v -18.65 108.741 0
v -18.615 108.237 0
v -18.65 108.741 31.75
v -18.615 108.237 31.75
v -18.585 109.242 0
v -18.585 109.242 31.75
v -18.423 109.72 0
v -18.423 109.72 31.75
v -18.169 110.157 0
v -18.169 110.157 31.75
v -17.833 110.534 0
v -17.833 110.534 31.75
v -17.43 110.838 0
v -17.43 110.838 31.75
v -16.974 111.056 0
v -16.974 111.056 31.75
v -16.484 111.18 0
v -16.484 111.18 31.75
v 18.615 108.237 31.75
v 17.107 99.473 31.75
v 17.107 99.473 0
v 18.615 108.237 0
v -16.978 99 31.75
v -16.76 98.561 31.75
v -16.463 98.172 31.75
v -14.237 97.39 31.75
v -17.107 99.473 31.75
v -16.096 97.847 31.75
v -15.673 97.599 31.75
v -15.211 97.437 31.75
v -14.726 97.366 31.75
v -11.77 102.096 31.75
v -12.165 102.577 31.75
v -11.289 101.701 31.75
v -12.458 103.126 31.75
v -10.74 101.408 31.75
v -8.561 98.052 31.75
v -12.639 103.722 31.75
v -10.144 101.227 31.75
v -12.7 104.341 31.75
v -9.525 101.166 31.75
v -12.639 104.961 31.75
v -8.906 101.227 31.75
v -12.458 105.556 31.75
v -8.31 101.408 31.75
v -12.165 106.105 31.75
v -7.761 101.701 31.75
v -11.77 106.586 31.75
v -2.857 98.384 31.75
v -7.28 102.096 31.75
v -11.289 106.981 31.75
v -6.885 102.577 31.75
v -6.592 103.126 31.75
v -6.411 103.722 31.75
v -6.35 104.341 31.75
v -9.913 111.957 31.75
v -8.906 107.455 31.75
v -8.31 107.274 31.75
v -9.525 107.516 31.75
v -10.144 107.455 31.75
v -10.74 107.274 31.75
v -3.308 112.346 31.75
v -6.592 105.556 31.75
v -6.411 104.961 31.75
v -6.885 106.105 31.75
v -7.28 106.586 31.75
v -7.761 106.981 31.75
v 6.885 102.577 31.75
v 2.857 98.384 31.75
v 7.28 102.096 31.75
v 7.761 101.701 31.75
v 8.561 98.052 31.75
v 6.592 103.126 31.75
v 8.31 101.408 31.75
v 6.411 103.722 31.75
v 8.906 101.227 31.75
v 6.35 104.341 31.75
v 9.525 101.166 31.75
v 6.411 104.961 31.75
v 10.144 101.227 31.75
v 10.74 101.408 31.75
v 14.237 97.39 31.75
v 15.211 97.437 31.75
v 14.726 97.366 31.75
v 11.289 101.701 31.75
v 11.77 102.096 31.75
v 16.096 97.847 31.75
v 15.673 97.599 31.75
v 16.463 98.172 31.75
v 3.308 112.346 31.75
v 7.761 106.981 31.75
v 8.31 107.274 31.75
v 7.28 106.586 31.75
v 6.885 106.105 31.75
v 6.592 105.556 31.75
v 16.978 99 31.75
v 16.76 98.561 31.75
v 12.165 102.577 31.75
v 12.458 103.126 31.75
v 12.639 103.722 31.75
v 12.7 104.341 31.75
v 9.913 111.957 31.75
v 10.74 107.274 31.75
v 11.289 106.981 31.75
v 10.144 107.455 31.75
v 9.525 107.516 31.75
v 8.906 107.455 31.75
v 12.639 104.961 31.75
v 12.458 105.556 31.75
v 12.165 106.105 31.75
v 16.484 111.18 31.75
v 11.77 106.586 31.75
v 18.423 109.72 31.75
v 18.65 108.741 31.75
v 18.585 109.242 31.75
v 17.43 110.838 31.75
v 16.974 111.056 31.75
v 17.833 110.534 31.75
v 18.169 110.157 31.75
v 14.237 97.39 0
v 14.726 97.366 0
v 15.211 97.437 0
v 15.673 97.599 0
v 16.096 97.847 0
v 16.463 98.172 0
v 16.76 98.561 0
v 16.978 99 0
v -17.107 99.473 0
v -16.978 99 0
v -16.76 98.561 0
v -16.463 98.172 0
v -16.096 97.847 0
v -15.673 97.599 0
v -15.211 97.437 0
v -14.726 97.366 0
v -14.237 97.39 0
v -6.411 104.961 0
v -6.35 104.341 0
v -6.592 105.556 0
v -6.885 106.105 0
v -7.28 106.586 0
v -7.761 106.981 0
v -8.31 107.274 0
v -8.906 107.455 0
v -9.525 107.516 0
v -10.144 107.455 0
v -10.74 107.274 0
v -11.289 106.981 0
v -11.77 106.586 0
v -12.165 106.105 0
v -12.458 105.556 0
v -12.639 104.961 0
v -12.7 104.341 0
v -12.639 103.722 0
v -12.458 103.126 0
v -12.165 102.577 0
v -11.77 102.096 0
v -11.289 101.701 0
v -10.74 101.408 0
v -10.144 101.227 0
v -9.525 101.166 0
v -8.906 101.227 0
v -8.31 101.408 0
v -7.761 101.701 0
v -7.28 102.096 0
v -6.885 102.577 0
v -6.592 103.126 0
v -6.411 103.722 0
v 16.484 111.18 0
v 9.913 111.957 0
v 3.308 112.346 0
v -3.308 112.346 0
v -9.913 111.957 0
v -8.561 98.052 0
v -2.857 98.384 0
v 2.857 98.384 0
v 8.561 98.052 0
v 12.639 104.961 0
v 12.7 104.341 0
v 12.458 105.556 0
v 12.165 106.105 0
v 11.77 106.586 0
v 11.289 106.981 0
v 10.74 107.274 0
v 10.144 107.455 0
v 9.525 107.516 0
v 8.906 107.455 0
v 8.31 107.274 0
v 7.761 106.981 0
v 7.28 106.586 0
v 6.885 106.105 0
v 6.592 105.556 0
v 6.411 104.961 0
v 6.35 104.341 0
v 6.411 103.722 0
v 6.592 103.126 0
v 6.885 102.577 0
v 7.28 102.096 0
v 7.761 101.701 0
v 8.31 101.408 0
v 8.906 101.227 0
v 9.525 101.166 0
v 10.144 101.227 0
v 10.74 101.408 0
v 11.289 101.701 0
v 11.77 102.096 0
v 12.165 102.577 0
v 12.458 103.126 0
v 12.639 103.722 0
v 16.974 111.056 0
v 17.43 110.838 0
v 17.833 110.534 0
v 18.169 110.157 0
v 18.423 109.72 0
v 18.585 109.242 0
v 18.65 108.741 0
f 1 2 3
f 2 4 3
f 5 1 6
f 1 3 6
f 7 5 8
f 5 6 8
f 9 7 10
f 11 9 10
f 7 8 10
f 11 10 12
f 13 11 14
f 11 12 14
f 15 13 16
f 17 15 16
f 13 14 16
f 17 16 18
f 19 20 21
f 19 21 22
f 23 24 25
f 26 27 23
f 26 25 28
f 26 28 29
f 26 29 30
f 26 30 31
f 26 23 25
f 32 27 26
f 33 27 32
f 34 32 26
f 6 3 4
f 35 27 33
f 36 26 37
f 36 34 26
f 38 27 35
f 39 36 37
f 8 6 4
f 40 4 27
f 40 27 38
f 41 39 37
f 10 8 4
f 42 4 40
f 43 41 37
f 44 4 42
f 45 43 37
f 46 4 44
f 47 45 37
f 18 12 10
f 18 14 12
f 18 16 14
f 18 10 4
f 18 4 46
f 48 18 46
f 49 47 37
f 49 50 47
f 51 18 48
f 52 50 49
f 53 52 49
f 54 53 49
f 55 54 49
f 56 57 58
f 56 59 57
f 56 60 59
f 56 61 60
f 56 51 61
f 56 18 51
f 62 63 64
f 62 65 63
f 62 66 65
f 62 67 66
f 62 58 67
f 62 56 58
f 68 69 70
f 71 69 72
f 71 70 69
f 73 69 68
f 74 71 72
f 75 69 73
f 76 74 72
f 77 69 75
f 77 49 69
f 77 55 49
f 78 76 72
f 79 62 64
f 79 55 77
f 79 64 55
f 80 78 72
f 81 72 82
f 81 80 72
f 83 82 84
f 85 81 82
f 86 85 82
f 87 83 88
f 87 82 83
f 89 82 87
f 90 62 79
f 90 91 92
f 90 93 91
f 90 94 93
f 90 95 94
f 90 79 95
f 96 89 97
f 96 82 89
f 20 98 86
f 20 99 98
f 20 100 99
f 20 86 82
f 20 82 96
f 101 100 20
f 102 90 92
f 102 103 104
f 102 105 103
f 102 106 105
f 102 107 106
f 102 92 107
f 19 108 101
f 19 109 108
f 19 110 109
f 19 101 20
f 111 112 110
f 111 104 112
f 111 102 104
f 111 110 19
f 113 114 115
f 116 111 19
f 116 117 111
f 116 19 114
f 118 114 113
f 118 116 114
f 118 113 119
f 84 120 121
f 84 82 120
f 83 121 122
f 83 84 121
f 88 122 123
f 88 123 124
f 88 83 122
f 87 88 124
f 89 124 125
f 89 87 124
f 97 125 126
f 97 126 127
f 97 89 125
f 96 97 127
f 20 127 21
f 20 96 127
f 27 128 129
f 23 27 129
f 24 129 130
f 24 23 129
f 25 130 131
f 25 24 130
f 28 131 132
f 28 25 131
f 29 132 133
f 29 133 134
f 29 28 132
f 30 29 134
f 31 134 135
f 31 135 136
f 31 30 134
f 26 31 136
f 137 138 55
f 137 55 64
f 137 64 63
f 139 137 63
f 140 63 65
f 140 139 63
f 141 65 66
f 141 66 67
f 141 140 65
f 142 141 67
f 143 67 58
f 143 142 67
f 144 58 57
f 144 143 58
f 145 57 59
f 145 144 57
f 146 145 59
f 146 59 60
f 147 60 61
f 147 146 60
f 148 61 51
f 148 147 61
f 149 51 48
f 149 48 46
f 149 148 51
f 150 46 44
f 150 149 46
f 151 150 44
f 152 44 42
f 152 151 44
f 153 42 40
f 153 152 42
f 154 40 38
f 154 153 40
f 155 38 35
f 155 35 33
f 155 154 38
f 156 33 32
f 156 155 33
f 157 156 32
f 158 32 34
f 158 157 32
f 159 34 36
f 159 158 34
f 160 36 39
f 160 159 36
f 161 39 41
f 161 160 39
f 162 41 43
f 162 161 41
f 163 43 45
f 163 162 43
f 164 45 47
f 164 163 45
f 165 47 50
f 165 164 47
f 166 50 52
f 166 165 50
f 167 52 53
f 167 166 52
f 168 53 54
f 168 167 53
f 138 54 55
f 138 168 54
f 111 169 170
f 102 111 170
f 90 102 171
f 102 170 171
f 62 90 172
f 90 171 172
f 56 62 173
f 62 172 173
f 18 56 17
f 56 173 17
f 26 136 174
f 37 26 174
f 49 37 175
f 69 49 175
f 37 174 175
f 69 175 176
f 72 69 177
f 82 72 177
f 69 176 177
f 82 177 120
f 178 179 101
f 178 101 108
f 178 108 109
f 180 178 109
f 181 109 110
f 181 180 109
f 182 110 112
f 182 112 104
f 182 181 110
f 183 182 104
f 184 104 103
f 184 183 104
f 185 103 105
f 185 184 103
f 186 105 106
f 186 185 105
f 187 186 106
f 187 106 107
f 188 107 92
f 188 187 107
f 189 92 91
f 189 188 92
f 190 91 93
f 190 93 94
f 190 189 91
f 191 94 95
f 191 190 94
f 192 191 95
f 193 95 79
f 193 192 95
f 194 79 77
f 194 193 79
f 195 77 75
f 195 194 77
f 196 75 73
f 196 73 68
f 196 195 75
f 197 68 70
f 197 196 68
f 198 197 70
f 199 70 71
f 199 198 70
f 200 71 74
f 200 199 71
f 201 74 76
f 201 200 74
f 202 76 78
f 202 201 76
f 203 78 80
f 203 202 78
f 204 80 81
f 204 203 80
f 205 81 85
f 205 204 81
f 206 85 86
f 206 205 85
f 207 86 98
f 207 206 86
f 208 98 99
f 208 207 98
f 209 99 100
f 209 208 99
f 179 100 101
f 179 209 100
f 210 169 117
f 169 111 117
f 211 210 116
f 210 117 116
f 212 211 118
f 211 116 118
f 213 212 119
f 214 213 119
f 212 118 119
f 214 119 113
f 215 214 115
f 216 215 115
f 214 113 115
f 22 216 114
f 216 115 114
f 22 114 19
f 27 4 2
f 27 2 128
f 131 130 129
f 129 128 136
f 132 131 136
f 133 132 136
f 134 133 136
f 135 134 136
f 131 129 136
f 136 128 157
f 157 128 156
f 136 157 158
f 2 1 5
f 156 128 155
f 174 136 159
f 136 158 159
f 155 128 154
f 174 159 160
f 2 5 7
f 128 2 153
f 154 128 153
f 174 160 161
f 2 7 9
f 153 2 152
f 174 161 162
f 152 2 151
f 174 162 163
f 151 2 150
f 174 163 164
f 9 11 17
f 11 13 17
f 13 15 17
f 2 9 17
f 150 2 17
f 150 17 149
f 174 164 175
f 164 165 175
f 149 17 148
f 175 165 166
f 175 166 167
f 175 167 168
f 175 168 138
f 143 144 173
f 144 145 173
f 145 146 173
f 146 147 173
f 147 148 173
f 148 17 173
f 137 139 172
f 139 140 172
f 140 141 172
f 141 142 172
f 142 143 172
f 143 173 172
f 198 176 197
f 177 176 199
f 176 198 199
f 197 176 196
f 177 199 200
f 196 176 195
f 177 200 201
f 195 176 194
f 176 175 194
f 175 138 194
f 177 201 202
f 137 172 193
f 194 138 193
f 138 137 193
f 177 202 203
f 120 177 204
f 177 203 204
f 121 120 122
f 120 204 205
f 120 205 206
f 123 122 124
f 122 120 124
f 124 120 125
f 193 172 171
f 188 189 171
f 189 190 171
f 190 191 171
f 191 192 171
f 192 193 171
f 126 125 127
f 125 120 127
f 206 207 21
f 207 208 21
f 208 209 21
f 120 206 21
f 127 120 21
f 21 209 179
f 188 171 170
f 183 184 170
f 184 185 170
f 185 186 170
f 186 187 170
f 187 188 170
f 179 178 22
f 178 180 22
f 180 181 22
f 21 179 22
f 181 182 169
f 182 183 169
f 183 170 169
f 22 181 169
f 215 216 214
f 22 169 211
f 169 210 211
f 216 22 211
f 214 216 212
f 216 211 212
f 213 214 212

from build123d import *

# Parameters (mm, degrees)
SKETCH1_R           = 3.175
BOSS_EXTRUDE1_DEPTH = 31.75
FILLET1_R           = 2.54


with BuildPart() as part:
    # Sketch1 → Boss-Extrude1 (new body)
    with BuildSketch(Plane.XY):
        with BuildLine():
            Line((-19.05, 110.768829212), (-16.68220339, 97.000952135))
            ThreePointArc((-16.68220339, 97.000952135), (0, 98.425), (16.68220339, 97.000952135))
            Line((16.68220339, 97.000952135), (19.05, 110.768829212))
            ThreePointArc((19.05, 110.768829212), (0, 112.395), (-19.05, 110.768829212))
        make_face()
        with Locations((9.525, 104.341147205)):
            Circle(SKETCH1_R, mode=Mode.SUBTRACT)
        with Locations((-9.525, 104.341147205)):
            Circle(SKETCH1_R, mode=Mode.SUBTRACT)
    extrude(amount=BOSS_EXTRUDE1_DEPTH)

    # Fillet1
    fillet1_edges = [part.edges().sort_by_distance(p)[0] for p in [
        (19.05, 110.768829212, 15.875),
        (16.68220339, 97.000952135, 15.875),
        (-16.68220339, 97.000952135, 15.875),
        (-19.05, 110.768829212, 15.875),
    ]]
    fillet(fillet1_edges, radius=FILLET1_R)


solid = part.part
